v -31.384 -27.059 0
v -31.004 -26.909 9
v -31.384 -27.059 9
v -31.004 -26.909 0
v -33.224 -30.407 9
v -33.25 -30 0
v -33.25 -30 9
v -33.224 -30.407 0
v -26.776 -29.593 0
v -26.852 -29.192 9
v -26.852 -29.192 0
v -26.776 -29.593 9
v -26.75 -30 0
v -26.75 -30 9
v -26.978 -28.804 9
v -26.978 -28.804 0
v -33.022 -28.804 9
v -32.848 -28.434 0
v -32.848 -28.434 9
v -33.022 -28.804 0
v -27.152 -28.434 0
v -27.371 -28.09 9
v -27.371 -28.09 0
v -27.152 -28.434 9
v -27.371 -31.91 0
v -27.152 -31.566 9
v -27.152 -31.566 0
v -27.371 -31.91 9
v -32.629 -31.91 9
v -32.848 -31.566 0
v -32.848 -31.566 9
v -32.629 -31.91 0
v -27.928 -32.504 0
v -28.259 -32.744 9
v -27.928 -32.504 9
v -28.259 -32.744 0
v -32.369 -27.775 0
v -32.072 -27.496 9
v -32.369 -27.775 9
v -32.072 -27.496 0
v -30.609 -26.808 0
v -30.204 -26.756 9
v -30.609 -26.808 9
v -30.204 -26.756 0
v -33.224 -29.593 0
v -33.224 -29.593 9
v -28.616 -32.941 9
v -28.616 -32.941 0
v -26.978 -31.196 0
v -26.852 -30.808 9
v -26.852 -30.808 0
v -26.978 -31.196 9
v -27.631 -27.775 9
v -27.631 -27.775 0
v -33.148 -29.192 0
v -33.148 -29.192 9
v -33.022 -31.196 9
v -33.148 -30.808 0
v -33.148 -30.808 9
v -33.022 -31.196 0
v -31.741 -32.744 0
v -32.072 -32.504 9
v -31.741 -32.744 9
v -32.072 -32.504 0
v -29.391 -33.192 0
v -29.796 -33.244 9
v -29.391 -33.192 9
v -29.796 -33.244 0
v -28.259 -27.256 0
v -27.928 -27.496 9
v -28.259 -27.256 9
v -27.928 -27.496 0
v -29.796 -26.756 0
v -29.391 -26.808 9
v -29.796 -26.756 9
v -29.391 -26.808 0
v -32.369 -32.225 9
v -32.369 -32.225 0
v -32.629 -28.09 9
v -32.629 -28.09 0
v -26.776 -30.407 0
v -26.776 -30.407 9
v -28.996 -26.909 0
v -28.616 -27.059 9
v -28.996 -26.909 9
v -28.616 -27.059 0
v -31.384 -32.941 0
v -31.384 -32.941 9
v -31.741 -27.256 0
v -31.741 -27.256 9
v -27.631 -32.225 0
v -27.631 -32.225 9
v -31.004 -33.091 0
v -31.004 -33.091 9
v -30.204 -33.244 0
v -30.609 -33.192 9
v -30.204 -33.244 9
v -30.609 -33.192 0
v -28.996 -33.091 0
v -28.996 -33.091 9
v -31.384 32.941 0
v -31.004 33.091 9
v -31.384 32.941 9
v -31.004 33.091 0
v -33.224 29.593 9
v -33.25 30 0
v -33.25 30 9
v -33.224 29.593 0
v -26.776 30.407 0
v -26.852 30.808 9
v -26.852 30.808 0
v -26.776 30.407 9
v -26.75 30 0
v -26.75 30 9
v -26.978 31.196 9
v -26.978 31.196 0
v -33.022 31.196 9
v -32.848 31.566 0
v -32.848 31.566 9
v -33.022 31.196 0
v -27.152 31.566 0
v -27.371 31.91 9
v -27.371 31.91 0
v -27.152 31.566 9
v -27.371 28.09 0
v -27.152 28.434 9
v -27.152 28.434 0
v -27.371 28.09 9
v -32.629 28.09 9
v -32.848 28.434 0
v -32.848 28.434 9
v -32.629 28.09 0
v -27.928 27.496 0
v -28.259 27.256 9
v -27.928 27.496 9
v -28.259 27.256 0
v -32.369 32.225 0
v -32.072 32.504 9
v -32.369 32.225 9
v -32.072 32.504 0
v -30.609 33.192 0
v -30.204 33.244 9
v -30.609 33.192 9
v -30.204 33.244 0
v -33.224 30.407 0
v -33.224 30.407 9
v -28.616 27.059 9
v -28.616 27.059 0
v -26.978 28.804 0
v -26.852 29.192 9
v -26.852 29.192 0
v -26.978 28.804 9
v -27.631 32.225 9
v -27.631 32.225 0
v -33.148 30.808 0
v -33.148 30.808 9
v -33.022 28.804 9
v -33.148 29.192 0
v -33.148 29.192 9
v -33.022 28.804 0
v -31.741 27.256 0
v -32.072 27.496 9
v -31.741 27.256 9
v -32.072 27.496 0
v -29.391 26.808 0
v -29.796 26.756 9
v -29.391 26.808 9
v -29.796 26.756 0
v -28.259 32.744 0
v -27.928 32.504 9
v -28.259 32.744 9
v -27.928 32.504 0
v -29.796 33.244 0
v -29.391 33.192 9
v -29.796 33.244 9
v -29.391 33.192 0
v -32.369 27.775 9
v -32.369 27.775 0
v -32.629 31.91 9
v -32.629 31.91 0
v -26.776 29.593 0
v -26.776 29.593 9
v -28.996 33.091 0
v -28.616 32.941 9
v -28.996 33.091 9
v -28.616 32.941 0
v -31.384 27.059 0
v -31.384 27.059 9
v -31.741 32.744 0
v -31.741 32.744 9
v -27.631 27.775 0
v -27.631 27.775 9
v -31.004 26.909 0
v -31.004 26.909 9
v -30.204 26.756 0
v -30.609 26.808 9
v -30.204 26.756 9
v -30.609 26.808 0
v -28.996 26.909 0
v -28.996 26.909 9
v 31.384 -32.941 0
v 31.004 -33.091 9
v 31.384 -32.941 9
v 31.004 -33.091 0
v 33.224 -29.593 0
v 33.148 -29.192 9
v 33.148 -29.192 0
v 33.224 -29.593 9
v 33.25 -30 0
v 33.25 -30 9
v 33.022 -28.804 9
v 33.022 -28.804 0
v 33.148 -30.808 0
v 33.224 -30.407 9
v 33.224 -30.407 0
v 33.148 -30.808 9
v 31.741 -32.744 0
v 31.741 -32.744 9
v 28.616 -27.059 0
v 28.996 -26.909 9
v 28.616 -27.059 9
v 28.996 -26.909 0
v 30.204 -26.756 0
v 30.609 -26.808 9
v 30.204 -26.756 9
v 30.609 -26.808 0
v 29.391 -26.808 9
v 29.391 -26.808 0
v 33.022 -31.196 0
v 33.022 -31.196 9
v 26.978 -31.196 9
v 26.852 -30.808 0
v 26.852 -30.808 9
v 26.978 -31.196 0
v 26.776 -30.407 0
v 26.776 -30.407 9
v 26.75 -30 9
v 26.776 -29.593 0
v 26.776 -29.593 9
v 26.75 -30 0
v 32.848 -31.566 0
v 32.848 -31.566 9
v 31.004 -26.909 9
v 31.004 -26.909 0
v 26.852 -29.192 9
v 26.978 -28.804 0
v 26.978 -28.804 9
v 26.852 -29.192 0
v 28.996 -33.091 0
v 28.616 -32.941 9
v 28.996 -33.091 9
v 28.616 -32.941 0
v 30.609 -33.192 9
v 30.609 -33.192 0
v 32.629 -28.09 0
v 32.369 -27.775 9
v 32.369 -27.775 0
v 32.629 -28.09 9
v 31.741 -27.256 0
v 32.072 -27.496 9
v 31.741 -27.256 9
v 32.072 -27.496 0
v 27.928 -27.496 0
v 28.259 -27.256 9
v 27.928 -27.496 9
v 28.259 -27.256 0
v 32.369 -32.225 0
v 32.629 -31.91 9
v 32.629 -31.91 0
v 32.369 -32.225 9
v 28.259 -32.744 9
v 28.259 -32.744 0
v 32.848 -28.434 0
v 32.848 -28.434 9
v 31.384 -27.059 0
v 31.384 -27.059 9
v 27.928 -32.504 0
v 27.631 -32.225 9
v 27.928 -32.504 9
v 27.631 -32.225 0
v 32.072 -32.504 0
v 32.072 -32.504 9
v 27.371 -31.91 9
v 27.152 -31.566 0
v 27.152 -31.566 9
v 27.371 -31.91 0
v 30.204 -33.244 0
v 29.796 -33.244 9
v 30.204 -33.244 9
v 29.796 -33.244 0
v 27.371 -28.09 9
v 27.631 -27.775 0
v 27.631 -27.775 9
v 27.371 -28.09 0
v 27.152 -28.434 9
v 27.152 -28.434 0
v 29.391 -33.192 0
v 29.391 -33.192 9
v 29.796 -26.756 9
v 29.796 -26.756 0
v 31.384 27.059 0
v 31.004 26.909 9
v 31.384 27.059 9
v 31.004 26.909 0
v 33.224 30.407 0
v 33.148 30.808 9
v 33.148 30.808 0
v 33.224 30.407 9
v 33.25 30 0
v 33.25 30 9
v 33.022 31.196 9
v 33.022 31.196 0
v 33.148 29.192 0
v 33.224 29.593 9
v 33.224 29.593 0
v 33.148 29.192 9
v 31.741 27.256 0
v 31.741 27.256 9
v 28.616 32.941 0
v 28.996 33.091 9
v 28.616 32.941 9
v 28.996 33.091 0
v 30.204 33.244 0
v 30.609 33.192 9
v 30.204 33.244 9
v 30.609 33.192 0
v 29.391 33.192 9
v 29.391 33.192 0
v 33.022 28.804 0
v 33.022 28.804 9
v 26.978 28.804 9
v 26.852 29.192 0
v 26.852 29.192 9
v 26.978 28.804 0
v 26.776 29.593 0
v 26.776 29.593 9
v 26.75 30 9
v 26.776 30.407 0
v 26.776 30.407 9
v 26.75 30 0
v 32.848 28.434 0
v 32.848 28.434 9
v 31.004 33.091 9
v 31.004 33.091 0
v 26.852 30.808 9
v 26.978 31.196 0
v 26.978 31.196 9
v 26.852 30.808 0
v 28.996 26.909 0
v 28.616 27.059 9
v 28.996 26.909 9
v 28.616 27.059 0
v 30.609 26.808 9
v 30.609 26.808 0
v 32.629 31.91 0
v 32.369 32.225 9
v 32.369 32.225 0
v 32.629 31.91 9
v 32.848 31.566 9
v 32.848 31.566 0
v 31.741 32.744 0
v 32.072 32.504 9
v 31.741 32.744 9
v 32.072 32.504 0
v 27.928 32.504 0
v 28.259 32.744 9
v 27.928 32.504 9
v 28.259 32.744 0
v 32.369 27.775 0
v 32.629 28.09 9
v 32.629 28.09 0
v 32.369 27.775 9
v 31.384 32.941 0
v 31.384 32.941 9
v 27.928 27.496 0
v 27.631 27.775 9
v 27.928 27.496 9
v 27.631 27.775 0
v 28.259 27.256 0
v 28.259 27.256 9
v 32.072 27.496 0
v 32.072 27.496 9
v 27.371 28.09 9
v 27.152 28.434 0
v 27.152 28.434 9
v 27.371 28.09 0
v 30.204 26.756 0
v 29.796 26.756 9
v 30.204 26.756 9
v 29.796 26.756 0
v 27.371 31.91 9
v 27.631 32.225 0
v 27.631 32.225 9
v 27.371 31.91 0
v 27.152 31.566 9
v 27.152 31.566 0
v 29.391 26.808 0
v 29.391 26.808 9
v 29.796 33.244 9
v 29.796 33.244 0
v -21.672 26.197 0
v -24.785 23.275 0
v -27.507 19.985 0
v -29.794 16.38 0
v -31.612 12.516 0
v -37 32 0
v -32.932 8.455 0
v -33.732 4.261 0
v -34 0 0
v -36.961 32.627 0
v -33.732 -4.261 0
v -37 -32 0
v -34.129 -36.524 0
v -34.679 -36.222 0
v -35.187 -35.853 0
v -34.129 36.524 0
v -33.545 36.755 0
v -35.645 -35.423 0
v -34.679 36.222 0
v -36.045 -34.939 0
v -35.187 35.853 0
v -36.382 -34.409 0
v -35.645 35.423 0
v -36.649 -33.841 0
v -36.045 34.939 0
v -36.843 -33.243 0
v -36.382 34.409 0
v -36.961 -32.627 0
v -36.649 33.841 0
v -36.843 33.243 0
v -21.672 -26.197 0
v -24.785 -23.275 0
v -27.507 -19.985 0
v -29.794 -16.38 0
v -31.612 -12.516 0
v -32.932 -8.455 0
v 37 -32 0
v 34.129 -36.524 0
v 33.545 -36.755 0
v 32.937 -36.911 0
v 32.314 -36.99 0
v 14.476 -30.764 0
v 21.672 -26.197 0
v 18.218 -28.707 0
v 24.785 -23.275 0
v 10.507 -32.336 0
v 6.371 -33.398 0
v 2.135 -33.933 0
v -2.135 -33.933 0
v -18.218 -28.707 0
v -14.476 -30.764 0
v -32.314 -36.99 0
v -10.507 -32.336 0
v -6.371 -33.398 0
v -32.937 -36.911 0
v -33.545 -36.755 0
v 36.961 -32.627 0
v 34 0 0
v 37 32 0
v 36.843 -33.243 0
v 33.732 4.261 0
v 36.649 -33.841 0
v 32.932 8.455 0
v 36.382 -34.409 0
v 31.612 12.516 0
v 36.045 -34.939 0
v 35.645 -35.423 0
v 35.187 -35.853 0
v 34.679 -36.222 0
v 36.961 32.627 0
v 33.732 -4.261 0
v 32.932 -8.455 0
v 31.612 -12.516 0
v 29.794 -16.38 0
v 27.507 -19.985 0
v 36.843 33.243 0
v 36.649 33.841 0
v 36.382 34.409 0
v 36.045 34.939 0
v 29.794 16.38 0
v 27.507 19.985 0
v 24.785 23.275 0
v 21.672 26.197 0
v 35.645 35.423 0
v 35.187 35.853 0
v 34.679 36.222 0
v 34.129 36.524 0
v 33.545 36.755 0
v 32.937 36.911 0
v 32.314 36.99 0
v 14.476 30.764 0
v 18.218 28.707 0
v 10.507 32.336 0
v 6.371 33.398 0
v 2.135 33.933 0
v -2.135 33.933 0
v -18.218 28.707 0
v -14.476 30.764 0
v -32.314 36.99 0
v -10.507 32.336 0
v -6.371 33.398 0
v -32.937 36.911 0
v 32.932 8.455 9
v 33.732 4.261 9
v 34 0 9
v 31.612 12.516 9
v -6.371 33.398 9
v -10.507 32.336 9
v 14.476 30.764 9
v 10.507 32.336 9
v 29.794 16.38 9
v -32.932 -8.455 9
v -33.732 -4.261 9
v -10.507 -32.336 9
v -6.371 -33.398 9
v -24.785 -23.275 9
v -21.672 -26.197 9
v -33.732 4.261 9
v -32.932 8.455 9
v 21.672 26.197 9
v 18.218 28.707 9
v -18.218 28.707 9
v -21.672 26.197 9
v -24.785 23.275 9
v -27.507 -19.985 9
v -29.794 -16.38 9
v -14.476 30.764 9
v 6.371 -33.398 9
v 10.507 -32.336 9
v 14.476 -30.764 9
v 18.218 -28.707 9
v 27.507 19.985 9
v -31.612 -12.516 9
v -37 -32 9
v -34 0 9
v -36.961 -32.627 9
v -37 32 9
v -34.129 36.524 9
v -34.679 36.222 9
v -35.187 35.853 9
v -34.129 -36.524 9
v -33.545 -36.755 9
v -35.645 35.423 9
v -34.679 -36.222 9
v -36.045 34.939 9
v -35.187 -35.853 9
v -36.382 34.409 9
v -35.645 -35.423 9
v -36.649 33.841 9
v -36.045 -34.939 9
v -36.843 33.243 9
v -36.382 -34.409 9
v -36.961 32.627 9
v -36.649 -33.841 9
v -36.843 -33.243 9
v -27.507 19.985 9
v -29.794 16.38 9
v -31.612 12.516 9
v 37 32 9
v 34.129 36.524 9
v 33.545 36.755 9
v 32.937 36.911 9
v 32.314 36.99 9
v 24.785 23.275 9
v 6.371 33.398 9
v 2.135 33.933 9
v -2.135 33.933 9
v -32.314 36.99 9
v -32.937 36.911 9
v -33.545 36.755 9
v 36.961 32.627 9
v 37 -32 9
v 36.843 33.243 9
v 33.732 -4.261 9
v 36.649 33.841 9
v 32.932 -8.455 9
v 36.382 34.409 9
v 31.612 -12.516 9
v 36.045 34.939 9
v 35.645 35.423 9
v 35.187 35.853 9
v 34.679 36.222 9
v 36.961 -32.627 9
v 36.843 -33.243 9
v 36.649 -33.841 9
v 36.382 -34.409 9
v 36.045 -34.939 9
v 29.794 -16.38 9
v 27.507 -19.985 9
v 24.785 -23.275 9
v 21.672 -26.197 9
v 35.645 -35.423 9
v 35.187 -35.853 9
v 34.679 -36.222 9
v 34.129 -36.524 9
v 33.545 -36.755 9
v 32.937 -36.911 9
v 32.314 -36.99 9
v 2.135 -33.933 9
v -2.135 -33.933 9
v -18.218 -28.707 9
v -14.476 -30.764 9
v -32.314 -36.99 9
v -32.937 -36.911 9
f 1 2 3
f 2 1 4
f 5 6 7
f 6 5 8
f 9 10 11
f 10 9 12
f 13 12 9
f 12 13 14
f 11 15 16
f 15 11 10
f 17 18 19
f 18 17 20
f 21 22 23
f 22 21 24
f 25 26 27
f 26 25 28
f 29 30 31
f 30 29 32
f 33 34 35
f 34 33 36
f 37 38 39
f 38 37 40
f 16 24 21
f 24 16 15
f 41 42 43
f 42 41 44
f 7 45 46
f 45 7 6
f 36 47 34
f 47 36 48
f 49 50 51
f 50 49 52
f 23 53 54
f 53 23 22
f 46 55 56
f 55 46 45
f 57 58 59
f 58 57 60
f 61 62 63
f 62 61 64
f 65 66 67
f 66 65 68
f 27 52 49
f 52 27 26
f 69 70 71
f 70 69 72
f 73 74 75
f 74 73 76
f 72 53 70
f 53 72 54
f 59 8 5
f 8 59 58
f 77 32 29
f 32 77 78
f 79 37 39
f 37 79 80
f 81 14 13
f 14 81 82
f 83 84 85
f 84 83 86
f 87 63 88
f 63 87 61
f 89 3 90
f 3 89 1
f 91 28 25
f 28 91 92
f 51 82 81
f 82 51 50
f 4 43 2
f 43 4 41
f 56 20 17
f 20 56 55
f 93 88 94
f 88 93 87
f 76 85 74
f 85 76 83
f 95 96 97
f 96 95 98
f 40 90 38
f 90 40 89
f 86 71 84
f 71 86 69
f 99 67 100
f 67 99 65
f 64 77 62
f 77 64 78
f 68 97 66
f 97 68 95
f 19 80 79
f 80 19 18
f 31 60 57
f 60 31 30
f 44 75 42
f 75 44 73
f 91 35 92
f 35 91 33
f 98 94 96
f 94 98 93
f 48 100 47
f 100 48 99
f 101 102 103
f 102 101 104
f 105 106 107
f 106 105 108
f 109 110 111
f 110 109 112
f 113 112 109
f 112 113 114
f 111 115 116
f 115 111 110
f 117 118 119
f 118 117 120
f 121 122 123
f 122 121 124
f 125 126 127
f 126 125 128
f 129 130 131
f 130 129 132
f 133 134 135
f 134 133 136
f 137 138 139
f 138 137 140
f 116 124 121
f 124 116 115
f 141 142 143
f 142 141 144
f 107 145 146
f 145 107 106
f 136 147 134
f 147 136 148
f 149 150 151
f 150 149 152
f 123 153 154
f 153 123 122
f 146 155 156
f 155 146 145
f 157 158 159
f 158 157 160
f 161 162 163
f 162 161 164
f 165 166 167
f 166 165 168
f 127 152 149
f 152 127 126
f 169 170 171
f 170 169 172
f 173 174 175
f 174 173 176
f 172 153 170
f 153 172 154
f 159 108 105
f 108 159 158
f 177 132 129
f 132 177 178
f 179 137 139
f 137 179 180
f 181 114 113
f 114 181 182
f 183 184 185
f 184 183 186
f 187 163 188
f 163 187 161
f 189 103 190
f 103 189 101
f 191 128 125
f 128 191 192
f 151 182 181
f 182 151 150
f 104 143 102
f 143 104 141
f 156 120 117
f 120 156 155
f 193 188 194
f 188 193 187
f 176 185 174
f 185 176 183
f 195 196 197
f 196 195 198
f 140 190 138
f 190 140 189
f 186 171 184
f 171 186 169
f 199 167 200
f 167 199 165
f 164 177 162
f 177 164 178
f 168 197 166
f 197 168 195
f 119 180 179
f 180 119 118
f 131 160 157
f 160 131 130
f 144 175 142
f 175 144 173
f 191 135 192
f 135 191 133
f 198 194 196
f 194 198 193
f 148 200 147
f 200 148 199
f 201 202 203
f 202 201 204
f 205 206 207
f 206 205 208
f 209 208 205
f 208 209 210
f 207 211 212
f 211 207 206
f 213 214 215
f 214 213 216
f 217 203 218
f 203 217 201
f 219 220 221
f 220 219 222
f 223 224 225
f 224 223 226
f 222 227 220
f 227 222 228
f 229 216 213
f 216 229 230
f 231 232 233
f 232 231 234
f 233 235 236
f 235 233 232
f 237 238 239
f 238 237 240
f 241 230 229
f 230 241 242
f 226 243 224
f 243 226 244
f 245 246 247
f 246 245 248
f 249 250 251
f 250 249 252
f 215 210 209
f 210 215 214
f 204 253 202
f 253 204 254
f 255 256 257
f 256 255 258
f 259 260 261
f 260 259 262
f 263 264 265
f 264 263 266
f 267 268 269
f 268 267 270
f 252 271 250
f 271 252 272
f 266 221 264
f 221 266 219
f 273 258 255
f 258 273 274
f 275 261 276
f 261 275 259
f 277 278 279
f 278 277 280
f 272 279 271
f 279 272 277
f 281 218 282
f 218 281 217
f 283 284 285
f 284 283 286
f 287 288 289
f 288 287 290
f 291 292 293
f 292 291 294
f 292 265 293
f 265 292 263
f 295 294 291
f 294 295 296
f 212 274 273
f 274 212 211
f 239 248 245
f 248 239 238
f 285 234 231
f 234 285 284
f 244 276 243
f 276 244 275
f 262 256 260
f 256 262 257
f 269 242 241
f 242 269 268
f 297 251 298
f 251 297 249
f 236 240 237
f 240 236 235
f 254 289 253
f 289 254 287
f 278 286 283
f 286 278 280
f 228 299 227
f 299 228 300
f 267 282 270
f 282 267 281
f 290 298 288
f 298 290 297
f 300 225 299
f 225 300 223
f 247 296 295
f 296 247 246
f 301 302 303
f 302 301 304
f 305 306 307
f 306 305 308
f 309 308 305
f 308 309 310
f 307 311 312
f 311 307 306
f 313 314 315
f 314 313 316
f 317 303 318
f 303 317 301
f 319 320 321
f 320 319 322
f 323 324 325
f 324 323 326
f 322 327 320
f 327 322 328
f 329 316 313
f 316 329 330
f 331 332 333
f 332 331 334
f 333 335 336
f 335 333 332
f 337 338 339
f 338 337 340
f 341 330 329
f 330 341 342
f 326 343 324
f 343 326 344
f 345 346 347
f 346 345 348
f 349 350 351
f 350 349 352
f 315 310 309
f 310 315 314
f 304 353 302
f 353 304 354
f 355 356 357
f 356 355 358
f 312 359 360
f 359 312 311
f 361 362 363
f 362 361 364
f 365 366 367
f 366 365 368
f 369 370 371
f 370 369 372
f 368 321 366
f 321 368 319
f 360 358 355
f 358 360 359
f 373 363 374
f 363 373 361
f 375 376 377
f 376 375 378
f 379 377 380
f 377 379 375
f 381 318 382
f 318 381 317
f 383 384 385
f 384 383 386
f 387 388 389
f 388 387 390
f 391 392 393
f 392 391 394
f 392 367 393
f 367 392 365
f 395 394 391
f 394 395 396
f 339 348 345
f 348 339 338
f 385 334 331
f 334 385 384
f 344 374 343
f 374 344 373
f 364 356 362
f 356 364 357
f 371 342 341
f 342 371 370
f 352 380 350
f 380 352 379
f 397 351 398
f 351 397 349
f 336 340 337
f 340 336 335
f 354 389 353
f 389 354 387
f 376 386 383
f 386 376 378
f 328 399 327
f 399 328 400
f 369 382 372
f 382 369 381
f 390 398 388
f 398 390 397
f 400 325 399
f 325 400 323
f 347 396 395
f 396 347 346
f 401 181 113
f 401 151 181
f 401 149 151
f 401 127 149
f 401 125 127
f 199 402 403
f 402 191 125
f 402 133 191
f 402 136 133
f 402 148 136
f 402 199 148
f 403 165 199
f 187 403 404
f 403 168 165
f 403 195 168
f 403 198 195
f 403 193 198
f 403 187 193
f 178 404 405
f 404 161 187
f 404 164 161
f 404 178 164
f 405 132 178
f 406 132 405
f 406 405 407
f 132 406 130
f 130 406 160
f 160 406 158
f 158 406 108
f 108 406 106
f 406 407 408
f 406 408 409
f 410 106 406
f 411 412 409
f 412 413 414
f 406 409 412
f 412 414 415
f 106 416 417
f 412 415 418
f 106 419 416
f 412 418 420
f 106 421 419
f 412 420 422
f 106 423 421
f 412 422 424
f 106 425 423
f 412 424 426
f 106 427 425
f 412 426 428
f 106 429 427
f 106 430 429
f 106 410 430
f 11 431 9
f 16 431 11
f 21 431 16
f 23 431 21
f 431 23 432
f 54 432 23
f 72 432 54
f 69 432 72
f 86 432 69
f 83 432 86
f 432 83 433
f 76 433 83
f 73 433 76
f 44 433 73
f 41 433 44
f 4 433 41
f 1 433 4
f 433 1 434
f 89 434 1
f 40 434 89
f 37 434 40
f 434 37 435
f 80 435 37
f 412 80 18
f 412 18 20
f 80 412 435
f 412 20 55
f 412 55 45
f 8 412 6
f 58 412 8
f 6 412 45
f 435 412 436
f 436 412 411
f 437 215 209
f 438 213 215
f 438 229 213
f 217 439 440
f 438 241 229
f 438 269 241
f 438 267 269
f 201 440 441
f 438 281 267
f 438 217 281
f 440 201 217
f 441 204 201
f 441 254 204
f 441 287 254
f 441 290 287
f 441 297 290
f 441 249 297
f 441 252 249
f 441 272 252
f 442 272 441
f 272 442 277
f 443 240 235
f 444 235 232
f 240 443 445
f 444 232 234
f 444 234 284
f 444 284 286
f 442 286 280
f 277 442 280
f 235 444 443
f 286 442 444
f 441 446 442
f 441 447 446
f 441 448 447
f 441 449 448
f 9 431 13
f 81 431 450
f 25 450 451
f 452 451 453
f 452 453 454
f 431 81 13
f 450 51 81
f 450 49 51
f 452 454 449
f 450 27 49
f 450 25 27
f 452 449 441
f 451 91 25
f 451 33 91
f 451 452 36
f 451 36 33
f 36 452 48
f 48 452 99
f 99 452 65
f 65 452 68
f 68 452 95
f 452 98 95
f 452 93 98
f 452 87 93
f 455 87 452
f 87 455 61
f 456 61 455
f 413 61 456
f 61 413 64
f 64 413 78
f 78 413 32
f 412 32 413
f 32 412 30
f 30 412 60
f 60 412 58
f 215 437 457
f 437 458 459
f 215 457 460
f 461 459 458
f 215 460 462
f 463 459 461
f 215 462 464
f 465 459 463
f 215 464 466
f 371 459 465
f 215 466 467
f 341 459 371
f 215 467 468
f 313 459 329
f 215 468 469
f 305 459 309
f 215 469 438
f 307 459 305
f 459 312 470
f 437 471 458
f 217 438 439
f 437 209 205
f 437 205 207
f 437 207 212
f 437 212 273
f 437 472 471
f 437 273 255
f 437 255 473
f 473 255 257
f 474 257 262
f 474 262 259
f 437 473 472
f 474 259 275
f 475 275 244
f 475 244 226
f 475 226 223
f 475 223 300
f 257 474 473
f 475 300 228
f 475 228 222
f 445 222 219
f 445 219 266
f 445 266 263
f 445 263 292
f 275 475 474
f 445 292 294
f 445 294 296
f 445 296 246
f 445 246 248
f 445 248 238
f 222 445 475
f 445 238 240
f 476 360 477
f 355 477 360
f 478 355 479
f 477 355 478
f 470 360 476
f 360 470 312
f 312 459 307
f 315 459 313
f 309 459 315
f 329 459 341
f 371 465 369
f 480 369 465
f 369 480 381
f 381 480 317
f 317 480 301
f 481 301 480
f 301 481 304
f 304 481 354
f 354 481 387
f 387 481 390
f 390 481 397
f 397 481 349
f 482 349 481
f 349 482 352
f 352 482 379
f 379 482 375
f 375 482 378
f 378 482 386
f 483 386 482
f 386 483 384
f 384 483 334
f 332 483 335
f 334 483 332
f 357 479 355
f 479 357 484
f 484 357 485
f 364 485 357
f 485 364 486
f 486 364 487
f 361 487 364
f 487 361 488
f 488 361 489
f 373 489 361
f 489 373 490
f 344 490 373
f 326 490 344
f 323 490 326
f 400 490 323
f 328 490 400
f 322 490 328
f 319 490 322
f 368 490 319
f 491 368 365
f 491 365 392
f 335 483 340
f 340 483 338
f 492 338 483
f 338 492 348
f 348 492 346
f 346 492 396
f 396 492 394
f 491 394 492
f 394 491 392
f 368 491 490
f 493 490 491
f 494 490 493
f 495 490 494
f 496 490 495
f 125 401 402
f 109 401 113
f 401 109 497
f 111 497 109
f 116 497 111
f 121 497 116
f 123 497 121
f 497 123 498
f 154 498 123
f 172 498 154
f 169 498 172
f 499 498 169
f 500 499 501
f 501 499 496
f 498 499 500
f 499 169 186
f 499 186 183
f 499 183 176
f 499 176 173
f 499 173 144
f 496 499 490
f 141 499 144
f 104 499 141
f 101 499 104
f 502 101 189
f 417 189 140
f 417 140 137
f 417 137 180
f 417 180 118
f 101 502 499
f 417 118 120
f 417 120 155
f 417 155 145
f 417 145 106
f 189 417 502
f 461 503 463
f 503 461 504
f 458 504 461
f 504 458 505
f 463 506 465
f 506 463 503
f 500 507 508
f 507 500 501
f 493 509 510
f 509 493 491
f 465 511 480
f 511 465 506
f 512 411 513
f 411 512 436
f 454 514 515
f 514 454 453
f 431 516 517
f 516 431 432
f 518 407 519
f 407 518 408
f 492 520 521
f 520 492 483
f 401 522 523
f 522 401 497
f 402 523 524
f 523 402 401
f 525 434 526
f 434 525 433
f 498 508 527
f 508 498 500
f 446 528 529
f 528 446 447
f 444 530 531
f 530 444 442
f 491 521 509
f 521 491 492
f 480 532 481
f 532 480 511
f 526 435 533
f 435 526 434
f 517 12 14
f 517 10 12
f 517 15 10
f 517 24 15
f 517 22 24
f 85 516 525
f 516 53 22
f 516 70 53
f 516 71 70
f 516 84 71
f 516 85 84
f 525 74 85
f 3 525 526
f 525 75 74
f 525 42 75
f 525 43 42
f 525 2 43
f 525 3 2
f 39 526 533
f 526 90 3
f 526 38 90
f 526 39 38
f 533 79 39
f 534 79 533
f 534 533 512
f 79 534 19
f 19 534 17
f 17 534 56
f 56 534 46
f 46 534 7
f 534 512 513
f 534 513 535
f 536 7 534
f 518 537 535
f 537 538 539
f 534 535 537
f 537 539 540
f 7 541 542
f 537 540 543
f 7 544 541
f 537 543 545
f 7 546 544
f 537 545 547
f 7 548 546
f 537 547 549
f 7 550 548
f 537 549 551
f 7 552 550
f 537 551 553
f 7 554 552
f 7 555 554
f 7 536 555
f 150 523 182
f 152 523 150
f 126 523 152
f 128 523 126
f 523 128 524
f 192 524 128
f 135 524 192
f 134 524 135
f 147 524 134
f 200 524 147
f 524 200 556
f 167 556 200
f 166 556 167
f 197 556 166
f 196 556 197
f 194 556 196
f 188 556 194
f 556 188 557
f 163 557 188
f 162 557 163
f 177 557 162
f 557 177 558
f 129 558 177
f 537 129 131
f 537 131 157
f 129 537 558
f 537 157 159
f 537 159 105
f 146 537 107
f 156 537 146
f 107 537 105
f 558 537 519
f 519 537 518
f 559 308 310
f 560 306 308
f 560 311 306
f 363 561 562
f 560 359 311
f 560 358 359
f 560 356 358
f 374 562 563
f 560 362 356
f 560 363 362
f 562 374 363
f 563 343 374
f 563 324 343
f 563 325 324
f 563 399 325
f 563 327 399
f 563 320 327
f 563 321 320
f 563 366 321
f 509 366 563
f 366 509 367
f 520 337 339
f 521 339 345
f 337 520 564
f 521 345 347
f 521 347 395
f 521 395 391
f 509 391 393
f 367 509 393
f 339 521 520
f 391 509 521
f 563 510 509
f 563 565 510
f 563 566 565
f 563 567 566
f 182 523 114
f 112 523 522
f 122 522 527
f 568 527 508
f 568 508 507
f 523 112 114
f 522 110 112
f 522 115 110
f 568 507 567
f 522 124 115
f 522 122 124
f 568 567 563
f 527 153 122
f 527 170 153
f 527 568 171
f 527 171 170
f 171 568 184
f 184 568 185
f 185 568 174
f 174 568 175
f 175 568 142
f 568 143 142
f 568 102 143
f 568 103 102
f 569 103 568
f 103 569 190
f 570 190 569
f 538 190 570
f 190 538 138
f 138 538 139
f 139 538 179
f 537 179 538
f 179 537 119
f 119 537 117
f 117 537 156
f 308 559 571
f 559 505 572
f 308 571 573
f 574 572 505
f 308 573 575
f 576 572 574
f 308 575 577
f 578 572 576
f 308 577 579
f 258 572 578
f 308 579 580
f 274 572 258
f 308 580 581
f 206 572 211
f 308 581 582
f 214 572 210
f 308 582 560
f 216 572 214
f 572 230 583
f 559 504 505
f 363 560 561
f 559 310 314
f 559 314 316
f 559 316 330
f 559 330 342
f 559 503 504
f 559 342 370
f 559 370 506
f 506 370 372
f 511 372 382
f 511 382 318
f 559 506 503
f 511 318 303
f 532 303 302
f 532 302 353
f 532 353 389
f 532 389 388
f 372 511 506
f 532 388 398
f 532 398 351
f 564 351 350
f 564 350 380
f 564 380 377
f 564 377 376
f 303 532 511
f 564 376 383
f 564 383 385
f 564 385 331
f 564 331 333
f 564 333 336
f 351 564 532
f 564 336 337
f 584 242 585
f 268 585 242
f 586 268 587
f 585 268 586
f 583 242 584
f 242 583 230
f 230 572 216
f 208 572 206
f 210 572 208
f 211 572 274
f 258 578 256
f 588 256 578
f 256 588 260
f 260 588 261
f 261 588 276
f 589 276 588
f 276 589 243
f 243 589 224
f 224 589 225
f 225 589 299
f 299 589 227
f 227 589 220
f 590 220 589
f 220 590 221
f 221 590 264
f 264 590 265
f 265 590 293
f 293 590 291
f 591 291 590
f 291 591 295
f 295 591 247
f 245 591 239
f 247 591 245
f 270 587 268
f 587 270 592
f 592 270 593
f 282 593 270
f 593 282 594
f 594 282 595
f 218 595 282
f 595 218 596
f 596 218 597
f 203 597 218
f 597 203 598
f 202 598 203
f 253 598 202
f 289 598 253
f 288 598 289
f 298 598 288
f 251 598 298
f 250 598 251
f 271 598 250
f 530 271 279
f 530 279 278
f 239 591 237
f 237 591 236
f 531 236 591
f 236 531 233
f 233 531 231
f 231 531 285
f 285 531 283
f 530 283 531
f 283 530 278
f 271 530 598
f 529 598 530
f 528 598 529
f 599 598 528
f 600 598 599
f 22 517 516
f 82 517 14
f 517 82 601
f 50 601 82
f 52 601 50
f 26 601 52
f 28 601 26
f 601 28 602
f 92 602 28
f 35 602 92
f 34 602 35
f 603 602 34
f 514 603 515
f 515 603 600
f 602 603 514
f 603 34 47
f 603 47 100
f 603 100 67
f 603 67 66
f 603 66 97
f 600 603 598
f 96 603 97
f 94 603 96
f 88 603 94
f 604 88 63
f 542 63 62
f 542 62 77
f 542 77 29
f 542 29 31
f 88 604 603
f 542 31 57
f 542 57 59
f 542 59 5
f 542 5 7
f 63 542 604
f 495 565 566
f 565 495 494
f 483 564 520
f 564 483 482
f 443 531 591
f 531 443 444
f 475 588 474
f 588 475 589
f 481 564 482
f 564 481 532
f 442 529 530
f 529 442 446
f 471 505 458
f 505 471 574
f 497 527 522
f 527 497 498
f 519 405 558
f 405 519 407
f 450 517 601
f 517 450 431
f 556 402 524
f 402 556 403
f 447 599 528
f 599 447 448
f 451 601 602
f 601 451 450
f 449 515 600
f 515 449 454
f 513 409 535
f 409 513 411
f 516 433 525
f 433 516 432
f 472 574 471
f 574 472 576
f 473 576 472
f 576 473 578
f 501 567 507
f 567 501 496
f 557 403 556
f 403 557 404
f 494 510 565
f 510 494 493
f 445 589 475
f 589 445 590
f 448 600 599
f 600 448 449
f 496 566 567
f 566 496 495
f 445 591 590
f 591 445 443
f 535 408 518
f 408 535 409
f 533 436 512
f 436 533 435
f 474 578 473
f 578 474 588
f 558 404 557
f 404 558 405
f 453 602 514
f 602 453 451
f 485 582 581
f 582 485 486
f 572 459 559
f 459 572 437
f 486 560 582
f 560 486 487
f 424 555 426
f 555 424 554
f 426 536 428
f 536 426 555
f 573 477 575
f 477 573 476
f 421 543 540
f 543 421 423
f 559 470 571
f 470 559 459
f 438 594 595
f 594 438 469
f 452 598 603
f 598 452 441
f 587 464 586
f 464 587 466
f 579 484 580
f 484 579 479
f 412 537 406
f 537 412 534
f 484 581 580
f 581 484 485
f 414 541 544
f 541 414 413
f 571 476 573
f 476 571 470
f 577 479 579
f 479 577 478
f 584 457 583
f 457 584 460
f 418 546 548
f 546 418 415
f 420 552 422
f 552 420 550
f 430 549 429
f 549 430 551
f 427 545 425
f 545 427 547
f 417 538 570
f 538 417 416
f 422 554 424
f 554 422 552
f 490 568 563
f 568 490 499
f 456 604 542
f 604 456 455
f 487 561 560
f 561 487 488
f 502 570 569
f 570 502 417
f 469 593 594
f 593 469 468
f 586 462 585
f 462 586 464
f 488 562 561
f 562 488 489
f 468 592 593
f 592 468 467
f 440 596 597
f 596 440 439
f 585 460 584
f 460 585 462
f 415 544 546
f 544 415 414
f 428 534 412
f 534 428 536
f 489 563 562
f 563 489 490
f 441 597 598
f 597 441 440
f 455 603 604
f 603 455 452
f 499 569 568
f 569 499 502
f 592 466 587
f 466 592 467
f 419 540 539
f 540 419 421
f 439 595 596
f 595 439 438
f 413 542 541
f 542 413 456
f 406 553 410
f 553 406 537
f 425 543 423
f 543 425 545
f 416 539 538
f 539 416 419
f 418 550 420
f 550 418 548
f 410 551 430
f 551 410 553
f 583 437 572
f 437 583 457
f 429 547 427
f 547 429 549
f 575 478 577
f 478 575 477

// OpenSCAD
$fn = 50;

difference() {
	union() {
		hull() {
			translate(v = [-32.0, 32.0, 0]) {
				cylinder(h = 9, r = 5);
			}
			translate(v = [32.0, 32.0, 0]) {
				cylinder(h = 9, r = 5);
			}
			translate(v = [-32.0, -32.0, 0]) {
				cylinder(h = 9, r = 5);
			}
			translate(v = [32.0, -32.0, 0]) {
				cylinder(h = 9, r = 5);
			}
		}
	}
	union() {
		translate(v = [-30.0, -30.0, -100.0]) {
			cylinder(h = 200, r = 3.25);
		}
		translate(v = [-30.0, 30.0, -100.0]) {
			cylinder(h = 200, r = 3.25);
		}
		translate(v = [30.0, -30.0, -100.0]) {
			cylinder(h = 200, r = 3.25);
		}
		translate(v = [30.0, 30.0, -100.0]) {
			cylinder(h = 200, r = 3.25);
		}
		translate(v = [-30.0, -30.0, -100.0]) {
			cylinder(h = 200, r = 1.8);
		}
		translate(v = [-30.0, 30.0, -100.0]) {
			cylinder(h = 200, r = 1.8);
		}
		translate(v = [30.0, -30.0, -100.0]) {
			cylinder(h = 200, r = 1.8);
		}
		translate(v = [30.0, 30.0, -100.0]) {
			cylinder(h = 200, r = 1.8);
		}
		cylinder(h = 9, r = 34.0);
	}
}
